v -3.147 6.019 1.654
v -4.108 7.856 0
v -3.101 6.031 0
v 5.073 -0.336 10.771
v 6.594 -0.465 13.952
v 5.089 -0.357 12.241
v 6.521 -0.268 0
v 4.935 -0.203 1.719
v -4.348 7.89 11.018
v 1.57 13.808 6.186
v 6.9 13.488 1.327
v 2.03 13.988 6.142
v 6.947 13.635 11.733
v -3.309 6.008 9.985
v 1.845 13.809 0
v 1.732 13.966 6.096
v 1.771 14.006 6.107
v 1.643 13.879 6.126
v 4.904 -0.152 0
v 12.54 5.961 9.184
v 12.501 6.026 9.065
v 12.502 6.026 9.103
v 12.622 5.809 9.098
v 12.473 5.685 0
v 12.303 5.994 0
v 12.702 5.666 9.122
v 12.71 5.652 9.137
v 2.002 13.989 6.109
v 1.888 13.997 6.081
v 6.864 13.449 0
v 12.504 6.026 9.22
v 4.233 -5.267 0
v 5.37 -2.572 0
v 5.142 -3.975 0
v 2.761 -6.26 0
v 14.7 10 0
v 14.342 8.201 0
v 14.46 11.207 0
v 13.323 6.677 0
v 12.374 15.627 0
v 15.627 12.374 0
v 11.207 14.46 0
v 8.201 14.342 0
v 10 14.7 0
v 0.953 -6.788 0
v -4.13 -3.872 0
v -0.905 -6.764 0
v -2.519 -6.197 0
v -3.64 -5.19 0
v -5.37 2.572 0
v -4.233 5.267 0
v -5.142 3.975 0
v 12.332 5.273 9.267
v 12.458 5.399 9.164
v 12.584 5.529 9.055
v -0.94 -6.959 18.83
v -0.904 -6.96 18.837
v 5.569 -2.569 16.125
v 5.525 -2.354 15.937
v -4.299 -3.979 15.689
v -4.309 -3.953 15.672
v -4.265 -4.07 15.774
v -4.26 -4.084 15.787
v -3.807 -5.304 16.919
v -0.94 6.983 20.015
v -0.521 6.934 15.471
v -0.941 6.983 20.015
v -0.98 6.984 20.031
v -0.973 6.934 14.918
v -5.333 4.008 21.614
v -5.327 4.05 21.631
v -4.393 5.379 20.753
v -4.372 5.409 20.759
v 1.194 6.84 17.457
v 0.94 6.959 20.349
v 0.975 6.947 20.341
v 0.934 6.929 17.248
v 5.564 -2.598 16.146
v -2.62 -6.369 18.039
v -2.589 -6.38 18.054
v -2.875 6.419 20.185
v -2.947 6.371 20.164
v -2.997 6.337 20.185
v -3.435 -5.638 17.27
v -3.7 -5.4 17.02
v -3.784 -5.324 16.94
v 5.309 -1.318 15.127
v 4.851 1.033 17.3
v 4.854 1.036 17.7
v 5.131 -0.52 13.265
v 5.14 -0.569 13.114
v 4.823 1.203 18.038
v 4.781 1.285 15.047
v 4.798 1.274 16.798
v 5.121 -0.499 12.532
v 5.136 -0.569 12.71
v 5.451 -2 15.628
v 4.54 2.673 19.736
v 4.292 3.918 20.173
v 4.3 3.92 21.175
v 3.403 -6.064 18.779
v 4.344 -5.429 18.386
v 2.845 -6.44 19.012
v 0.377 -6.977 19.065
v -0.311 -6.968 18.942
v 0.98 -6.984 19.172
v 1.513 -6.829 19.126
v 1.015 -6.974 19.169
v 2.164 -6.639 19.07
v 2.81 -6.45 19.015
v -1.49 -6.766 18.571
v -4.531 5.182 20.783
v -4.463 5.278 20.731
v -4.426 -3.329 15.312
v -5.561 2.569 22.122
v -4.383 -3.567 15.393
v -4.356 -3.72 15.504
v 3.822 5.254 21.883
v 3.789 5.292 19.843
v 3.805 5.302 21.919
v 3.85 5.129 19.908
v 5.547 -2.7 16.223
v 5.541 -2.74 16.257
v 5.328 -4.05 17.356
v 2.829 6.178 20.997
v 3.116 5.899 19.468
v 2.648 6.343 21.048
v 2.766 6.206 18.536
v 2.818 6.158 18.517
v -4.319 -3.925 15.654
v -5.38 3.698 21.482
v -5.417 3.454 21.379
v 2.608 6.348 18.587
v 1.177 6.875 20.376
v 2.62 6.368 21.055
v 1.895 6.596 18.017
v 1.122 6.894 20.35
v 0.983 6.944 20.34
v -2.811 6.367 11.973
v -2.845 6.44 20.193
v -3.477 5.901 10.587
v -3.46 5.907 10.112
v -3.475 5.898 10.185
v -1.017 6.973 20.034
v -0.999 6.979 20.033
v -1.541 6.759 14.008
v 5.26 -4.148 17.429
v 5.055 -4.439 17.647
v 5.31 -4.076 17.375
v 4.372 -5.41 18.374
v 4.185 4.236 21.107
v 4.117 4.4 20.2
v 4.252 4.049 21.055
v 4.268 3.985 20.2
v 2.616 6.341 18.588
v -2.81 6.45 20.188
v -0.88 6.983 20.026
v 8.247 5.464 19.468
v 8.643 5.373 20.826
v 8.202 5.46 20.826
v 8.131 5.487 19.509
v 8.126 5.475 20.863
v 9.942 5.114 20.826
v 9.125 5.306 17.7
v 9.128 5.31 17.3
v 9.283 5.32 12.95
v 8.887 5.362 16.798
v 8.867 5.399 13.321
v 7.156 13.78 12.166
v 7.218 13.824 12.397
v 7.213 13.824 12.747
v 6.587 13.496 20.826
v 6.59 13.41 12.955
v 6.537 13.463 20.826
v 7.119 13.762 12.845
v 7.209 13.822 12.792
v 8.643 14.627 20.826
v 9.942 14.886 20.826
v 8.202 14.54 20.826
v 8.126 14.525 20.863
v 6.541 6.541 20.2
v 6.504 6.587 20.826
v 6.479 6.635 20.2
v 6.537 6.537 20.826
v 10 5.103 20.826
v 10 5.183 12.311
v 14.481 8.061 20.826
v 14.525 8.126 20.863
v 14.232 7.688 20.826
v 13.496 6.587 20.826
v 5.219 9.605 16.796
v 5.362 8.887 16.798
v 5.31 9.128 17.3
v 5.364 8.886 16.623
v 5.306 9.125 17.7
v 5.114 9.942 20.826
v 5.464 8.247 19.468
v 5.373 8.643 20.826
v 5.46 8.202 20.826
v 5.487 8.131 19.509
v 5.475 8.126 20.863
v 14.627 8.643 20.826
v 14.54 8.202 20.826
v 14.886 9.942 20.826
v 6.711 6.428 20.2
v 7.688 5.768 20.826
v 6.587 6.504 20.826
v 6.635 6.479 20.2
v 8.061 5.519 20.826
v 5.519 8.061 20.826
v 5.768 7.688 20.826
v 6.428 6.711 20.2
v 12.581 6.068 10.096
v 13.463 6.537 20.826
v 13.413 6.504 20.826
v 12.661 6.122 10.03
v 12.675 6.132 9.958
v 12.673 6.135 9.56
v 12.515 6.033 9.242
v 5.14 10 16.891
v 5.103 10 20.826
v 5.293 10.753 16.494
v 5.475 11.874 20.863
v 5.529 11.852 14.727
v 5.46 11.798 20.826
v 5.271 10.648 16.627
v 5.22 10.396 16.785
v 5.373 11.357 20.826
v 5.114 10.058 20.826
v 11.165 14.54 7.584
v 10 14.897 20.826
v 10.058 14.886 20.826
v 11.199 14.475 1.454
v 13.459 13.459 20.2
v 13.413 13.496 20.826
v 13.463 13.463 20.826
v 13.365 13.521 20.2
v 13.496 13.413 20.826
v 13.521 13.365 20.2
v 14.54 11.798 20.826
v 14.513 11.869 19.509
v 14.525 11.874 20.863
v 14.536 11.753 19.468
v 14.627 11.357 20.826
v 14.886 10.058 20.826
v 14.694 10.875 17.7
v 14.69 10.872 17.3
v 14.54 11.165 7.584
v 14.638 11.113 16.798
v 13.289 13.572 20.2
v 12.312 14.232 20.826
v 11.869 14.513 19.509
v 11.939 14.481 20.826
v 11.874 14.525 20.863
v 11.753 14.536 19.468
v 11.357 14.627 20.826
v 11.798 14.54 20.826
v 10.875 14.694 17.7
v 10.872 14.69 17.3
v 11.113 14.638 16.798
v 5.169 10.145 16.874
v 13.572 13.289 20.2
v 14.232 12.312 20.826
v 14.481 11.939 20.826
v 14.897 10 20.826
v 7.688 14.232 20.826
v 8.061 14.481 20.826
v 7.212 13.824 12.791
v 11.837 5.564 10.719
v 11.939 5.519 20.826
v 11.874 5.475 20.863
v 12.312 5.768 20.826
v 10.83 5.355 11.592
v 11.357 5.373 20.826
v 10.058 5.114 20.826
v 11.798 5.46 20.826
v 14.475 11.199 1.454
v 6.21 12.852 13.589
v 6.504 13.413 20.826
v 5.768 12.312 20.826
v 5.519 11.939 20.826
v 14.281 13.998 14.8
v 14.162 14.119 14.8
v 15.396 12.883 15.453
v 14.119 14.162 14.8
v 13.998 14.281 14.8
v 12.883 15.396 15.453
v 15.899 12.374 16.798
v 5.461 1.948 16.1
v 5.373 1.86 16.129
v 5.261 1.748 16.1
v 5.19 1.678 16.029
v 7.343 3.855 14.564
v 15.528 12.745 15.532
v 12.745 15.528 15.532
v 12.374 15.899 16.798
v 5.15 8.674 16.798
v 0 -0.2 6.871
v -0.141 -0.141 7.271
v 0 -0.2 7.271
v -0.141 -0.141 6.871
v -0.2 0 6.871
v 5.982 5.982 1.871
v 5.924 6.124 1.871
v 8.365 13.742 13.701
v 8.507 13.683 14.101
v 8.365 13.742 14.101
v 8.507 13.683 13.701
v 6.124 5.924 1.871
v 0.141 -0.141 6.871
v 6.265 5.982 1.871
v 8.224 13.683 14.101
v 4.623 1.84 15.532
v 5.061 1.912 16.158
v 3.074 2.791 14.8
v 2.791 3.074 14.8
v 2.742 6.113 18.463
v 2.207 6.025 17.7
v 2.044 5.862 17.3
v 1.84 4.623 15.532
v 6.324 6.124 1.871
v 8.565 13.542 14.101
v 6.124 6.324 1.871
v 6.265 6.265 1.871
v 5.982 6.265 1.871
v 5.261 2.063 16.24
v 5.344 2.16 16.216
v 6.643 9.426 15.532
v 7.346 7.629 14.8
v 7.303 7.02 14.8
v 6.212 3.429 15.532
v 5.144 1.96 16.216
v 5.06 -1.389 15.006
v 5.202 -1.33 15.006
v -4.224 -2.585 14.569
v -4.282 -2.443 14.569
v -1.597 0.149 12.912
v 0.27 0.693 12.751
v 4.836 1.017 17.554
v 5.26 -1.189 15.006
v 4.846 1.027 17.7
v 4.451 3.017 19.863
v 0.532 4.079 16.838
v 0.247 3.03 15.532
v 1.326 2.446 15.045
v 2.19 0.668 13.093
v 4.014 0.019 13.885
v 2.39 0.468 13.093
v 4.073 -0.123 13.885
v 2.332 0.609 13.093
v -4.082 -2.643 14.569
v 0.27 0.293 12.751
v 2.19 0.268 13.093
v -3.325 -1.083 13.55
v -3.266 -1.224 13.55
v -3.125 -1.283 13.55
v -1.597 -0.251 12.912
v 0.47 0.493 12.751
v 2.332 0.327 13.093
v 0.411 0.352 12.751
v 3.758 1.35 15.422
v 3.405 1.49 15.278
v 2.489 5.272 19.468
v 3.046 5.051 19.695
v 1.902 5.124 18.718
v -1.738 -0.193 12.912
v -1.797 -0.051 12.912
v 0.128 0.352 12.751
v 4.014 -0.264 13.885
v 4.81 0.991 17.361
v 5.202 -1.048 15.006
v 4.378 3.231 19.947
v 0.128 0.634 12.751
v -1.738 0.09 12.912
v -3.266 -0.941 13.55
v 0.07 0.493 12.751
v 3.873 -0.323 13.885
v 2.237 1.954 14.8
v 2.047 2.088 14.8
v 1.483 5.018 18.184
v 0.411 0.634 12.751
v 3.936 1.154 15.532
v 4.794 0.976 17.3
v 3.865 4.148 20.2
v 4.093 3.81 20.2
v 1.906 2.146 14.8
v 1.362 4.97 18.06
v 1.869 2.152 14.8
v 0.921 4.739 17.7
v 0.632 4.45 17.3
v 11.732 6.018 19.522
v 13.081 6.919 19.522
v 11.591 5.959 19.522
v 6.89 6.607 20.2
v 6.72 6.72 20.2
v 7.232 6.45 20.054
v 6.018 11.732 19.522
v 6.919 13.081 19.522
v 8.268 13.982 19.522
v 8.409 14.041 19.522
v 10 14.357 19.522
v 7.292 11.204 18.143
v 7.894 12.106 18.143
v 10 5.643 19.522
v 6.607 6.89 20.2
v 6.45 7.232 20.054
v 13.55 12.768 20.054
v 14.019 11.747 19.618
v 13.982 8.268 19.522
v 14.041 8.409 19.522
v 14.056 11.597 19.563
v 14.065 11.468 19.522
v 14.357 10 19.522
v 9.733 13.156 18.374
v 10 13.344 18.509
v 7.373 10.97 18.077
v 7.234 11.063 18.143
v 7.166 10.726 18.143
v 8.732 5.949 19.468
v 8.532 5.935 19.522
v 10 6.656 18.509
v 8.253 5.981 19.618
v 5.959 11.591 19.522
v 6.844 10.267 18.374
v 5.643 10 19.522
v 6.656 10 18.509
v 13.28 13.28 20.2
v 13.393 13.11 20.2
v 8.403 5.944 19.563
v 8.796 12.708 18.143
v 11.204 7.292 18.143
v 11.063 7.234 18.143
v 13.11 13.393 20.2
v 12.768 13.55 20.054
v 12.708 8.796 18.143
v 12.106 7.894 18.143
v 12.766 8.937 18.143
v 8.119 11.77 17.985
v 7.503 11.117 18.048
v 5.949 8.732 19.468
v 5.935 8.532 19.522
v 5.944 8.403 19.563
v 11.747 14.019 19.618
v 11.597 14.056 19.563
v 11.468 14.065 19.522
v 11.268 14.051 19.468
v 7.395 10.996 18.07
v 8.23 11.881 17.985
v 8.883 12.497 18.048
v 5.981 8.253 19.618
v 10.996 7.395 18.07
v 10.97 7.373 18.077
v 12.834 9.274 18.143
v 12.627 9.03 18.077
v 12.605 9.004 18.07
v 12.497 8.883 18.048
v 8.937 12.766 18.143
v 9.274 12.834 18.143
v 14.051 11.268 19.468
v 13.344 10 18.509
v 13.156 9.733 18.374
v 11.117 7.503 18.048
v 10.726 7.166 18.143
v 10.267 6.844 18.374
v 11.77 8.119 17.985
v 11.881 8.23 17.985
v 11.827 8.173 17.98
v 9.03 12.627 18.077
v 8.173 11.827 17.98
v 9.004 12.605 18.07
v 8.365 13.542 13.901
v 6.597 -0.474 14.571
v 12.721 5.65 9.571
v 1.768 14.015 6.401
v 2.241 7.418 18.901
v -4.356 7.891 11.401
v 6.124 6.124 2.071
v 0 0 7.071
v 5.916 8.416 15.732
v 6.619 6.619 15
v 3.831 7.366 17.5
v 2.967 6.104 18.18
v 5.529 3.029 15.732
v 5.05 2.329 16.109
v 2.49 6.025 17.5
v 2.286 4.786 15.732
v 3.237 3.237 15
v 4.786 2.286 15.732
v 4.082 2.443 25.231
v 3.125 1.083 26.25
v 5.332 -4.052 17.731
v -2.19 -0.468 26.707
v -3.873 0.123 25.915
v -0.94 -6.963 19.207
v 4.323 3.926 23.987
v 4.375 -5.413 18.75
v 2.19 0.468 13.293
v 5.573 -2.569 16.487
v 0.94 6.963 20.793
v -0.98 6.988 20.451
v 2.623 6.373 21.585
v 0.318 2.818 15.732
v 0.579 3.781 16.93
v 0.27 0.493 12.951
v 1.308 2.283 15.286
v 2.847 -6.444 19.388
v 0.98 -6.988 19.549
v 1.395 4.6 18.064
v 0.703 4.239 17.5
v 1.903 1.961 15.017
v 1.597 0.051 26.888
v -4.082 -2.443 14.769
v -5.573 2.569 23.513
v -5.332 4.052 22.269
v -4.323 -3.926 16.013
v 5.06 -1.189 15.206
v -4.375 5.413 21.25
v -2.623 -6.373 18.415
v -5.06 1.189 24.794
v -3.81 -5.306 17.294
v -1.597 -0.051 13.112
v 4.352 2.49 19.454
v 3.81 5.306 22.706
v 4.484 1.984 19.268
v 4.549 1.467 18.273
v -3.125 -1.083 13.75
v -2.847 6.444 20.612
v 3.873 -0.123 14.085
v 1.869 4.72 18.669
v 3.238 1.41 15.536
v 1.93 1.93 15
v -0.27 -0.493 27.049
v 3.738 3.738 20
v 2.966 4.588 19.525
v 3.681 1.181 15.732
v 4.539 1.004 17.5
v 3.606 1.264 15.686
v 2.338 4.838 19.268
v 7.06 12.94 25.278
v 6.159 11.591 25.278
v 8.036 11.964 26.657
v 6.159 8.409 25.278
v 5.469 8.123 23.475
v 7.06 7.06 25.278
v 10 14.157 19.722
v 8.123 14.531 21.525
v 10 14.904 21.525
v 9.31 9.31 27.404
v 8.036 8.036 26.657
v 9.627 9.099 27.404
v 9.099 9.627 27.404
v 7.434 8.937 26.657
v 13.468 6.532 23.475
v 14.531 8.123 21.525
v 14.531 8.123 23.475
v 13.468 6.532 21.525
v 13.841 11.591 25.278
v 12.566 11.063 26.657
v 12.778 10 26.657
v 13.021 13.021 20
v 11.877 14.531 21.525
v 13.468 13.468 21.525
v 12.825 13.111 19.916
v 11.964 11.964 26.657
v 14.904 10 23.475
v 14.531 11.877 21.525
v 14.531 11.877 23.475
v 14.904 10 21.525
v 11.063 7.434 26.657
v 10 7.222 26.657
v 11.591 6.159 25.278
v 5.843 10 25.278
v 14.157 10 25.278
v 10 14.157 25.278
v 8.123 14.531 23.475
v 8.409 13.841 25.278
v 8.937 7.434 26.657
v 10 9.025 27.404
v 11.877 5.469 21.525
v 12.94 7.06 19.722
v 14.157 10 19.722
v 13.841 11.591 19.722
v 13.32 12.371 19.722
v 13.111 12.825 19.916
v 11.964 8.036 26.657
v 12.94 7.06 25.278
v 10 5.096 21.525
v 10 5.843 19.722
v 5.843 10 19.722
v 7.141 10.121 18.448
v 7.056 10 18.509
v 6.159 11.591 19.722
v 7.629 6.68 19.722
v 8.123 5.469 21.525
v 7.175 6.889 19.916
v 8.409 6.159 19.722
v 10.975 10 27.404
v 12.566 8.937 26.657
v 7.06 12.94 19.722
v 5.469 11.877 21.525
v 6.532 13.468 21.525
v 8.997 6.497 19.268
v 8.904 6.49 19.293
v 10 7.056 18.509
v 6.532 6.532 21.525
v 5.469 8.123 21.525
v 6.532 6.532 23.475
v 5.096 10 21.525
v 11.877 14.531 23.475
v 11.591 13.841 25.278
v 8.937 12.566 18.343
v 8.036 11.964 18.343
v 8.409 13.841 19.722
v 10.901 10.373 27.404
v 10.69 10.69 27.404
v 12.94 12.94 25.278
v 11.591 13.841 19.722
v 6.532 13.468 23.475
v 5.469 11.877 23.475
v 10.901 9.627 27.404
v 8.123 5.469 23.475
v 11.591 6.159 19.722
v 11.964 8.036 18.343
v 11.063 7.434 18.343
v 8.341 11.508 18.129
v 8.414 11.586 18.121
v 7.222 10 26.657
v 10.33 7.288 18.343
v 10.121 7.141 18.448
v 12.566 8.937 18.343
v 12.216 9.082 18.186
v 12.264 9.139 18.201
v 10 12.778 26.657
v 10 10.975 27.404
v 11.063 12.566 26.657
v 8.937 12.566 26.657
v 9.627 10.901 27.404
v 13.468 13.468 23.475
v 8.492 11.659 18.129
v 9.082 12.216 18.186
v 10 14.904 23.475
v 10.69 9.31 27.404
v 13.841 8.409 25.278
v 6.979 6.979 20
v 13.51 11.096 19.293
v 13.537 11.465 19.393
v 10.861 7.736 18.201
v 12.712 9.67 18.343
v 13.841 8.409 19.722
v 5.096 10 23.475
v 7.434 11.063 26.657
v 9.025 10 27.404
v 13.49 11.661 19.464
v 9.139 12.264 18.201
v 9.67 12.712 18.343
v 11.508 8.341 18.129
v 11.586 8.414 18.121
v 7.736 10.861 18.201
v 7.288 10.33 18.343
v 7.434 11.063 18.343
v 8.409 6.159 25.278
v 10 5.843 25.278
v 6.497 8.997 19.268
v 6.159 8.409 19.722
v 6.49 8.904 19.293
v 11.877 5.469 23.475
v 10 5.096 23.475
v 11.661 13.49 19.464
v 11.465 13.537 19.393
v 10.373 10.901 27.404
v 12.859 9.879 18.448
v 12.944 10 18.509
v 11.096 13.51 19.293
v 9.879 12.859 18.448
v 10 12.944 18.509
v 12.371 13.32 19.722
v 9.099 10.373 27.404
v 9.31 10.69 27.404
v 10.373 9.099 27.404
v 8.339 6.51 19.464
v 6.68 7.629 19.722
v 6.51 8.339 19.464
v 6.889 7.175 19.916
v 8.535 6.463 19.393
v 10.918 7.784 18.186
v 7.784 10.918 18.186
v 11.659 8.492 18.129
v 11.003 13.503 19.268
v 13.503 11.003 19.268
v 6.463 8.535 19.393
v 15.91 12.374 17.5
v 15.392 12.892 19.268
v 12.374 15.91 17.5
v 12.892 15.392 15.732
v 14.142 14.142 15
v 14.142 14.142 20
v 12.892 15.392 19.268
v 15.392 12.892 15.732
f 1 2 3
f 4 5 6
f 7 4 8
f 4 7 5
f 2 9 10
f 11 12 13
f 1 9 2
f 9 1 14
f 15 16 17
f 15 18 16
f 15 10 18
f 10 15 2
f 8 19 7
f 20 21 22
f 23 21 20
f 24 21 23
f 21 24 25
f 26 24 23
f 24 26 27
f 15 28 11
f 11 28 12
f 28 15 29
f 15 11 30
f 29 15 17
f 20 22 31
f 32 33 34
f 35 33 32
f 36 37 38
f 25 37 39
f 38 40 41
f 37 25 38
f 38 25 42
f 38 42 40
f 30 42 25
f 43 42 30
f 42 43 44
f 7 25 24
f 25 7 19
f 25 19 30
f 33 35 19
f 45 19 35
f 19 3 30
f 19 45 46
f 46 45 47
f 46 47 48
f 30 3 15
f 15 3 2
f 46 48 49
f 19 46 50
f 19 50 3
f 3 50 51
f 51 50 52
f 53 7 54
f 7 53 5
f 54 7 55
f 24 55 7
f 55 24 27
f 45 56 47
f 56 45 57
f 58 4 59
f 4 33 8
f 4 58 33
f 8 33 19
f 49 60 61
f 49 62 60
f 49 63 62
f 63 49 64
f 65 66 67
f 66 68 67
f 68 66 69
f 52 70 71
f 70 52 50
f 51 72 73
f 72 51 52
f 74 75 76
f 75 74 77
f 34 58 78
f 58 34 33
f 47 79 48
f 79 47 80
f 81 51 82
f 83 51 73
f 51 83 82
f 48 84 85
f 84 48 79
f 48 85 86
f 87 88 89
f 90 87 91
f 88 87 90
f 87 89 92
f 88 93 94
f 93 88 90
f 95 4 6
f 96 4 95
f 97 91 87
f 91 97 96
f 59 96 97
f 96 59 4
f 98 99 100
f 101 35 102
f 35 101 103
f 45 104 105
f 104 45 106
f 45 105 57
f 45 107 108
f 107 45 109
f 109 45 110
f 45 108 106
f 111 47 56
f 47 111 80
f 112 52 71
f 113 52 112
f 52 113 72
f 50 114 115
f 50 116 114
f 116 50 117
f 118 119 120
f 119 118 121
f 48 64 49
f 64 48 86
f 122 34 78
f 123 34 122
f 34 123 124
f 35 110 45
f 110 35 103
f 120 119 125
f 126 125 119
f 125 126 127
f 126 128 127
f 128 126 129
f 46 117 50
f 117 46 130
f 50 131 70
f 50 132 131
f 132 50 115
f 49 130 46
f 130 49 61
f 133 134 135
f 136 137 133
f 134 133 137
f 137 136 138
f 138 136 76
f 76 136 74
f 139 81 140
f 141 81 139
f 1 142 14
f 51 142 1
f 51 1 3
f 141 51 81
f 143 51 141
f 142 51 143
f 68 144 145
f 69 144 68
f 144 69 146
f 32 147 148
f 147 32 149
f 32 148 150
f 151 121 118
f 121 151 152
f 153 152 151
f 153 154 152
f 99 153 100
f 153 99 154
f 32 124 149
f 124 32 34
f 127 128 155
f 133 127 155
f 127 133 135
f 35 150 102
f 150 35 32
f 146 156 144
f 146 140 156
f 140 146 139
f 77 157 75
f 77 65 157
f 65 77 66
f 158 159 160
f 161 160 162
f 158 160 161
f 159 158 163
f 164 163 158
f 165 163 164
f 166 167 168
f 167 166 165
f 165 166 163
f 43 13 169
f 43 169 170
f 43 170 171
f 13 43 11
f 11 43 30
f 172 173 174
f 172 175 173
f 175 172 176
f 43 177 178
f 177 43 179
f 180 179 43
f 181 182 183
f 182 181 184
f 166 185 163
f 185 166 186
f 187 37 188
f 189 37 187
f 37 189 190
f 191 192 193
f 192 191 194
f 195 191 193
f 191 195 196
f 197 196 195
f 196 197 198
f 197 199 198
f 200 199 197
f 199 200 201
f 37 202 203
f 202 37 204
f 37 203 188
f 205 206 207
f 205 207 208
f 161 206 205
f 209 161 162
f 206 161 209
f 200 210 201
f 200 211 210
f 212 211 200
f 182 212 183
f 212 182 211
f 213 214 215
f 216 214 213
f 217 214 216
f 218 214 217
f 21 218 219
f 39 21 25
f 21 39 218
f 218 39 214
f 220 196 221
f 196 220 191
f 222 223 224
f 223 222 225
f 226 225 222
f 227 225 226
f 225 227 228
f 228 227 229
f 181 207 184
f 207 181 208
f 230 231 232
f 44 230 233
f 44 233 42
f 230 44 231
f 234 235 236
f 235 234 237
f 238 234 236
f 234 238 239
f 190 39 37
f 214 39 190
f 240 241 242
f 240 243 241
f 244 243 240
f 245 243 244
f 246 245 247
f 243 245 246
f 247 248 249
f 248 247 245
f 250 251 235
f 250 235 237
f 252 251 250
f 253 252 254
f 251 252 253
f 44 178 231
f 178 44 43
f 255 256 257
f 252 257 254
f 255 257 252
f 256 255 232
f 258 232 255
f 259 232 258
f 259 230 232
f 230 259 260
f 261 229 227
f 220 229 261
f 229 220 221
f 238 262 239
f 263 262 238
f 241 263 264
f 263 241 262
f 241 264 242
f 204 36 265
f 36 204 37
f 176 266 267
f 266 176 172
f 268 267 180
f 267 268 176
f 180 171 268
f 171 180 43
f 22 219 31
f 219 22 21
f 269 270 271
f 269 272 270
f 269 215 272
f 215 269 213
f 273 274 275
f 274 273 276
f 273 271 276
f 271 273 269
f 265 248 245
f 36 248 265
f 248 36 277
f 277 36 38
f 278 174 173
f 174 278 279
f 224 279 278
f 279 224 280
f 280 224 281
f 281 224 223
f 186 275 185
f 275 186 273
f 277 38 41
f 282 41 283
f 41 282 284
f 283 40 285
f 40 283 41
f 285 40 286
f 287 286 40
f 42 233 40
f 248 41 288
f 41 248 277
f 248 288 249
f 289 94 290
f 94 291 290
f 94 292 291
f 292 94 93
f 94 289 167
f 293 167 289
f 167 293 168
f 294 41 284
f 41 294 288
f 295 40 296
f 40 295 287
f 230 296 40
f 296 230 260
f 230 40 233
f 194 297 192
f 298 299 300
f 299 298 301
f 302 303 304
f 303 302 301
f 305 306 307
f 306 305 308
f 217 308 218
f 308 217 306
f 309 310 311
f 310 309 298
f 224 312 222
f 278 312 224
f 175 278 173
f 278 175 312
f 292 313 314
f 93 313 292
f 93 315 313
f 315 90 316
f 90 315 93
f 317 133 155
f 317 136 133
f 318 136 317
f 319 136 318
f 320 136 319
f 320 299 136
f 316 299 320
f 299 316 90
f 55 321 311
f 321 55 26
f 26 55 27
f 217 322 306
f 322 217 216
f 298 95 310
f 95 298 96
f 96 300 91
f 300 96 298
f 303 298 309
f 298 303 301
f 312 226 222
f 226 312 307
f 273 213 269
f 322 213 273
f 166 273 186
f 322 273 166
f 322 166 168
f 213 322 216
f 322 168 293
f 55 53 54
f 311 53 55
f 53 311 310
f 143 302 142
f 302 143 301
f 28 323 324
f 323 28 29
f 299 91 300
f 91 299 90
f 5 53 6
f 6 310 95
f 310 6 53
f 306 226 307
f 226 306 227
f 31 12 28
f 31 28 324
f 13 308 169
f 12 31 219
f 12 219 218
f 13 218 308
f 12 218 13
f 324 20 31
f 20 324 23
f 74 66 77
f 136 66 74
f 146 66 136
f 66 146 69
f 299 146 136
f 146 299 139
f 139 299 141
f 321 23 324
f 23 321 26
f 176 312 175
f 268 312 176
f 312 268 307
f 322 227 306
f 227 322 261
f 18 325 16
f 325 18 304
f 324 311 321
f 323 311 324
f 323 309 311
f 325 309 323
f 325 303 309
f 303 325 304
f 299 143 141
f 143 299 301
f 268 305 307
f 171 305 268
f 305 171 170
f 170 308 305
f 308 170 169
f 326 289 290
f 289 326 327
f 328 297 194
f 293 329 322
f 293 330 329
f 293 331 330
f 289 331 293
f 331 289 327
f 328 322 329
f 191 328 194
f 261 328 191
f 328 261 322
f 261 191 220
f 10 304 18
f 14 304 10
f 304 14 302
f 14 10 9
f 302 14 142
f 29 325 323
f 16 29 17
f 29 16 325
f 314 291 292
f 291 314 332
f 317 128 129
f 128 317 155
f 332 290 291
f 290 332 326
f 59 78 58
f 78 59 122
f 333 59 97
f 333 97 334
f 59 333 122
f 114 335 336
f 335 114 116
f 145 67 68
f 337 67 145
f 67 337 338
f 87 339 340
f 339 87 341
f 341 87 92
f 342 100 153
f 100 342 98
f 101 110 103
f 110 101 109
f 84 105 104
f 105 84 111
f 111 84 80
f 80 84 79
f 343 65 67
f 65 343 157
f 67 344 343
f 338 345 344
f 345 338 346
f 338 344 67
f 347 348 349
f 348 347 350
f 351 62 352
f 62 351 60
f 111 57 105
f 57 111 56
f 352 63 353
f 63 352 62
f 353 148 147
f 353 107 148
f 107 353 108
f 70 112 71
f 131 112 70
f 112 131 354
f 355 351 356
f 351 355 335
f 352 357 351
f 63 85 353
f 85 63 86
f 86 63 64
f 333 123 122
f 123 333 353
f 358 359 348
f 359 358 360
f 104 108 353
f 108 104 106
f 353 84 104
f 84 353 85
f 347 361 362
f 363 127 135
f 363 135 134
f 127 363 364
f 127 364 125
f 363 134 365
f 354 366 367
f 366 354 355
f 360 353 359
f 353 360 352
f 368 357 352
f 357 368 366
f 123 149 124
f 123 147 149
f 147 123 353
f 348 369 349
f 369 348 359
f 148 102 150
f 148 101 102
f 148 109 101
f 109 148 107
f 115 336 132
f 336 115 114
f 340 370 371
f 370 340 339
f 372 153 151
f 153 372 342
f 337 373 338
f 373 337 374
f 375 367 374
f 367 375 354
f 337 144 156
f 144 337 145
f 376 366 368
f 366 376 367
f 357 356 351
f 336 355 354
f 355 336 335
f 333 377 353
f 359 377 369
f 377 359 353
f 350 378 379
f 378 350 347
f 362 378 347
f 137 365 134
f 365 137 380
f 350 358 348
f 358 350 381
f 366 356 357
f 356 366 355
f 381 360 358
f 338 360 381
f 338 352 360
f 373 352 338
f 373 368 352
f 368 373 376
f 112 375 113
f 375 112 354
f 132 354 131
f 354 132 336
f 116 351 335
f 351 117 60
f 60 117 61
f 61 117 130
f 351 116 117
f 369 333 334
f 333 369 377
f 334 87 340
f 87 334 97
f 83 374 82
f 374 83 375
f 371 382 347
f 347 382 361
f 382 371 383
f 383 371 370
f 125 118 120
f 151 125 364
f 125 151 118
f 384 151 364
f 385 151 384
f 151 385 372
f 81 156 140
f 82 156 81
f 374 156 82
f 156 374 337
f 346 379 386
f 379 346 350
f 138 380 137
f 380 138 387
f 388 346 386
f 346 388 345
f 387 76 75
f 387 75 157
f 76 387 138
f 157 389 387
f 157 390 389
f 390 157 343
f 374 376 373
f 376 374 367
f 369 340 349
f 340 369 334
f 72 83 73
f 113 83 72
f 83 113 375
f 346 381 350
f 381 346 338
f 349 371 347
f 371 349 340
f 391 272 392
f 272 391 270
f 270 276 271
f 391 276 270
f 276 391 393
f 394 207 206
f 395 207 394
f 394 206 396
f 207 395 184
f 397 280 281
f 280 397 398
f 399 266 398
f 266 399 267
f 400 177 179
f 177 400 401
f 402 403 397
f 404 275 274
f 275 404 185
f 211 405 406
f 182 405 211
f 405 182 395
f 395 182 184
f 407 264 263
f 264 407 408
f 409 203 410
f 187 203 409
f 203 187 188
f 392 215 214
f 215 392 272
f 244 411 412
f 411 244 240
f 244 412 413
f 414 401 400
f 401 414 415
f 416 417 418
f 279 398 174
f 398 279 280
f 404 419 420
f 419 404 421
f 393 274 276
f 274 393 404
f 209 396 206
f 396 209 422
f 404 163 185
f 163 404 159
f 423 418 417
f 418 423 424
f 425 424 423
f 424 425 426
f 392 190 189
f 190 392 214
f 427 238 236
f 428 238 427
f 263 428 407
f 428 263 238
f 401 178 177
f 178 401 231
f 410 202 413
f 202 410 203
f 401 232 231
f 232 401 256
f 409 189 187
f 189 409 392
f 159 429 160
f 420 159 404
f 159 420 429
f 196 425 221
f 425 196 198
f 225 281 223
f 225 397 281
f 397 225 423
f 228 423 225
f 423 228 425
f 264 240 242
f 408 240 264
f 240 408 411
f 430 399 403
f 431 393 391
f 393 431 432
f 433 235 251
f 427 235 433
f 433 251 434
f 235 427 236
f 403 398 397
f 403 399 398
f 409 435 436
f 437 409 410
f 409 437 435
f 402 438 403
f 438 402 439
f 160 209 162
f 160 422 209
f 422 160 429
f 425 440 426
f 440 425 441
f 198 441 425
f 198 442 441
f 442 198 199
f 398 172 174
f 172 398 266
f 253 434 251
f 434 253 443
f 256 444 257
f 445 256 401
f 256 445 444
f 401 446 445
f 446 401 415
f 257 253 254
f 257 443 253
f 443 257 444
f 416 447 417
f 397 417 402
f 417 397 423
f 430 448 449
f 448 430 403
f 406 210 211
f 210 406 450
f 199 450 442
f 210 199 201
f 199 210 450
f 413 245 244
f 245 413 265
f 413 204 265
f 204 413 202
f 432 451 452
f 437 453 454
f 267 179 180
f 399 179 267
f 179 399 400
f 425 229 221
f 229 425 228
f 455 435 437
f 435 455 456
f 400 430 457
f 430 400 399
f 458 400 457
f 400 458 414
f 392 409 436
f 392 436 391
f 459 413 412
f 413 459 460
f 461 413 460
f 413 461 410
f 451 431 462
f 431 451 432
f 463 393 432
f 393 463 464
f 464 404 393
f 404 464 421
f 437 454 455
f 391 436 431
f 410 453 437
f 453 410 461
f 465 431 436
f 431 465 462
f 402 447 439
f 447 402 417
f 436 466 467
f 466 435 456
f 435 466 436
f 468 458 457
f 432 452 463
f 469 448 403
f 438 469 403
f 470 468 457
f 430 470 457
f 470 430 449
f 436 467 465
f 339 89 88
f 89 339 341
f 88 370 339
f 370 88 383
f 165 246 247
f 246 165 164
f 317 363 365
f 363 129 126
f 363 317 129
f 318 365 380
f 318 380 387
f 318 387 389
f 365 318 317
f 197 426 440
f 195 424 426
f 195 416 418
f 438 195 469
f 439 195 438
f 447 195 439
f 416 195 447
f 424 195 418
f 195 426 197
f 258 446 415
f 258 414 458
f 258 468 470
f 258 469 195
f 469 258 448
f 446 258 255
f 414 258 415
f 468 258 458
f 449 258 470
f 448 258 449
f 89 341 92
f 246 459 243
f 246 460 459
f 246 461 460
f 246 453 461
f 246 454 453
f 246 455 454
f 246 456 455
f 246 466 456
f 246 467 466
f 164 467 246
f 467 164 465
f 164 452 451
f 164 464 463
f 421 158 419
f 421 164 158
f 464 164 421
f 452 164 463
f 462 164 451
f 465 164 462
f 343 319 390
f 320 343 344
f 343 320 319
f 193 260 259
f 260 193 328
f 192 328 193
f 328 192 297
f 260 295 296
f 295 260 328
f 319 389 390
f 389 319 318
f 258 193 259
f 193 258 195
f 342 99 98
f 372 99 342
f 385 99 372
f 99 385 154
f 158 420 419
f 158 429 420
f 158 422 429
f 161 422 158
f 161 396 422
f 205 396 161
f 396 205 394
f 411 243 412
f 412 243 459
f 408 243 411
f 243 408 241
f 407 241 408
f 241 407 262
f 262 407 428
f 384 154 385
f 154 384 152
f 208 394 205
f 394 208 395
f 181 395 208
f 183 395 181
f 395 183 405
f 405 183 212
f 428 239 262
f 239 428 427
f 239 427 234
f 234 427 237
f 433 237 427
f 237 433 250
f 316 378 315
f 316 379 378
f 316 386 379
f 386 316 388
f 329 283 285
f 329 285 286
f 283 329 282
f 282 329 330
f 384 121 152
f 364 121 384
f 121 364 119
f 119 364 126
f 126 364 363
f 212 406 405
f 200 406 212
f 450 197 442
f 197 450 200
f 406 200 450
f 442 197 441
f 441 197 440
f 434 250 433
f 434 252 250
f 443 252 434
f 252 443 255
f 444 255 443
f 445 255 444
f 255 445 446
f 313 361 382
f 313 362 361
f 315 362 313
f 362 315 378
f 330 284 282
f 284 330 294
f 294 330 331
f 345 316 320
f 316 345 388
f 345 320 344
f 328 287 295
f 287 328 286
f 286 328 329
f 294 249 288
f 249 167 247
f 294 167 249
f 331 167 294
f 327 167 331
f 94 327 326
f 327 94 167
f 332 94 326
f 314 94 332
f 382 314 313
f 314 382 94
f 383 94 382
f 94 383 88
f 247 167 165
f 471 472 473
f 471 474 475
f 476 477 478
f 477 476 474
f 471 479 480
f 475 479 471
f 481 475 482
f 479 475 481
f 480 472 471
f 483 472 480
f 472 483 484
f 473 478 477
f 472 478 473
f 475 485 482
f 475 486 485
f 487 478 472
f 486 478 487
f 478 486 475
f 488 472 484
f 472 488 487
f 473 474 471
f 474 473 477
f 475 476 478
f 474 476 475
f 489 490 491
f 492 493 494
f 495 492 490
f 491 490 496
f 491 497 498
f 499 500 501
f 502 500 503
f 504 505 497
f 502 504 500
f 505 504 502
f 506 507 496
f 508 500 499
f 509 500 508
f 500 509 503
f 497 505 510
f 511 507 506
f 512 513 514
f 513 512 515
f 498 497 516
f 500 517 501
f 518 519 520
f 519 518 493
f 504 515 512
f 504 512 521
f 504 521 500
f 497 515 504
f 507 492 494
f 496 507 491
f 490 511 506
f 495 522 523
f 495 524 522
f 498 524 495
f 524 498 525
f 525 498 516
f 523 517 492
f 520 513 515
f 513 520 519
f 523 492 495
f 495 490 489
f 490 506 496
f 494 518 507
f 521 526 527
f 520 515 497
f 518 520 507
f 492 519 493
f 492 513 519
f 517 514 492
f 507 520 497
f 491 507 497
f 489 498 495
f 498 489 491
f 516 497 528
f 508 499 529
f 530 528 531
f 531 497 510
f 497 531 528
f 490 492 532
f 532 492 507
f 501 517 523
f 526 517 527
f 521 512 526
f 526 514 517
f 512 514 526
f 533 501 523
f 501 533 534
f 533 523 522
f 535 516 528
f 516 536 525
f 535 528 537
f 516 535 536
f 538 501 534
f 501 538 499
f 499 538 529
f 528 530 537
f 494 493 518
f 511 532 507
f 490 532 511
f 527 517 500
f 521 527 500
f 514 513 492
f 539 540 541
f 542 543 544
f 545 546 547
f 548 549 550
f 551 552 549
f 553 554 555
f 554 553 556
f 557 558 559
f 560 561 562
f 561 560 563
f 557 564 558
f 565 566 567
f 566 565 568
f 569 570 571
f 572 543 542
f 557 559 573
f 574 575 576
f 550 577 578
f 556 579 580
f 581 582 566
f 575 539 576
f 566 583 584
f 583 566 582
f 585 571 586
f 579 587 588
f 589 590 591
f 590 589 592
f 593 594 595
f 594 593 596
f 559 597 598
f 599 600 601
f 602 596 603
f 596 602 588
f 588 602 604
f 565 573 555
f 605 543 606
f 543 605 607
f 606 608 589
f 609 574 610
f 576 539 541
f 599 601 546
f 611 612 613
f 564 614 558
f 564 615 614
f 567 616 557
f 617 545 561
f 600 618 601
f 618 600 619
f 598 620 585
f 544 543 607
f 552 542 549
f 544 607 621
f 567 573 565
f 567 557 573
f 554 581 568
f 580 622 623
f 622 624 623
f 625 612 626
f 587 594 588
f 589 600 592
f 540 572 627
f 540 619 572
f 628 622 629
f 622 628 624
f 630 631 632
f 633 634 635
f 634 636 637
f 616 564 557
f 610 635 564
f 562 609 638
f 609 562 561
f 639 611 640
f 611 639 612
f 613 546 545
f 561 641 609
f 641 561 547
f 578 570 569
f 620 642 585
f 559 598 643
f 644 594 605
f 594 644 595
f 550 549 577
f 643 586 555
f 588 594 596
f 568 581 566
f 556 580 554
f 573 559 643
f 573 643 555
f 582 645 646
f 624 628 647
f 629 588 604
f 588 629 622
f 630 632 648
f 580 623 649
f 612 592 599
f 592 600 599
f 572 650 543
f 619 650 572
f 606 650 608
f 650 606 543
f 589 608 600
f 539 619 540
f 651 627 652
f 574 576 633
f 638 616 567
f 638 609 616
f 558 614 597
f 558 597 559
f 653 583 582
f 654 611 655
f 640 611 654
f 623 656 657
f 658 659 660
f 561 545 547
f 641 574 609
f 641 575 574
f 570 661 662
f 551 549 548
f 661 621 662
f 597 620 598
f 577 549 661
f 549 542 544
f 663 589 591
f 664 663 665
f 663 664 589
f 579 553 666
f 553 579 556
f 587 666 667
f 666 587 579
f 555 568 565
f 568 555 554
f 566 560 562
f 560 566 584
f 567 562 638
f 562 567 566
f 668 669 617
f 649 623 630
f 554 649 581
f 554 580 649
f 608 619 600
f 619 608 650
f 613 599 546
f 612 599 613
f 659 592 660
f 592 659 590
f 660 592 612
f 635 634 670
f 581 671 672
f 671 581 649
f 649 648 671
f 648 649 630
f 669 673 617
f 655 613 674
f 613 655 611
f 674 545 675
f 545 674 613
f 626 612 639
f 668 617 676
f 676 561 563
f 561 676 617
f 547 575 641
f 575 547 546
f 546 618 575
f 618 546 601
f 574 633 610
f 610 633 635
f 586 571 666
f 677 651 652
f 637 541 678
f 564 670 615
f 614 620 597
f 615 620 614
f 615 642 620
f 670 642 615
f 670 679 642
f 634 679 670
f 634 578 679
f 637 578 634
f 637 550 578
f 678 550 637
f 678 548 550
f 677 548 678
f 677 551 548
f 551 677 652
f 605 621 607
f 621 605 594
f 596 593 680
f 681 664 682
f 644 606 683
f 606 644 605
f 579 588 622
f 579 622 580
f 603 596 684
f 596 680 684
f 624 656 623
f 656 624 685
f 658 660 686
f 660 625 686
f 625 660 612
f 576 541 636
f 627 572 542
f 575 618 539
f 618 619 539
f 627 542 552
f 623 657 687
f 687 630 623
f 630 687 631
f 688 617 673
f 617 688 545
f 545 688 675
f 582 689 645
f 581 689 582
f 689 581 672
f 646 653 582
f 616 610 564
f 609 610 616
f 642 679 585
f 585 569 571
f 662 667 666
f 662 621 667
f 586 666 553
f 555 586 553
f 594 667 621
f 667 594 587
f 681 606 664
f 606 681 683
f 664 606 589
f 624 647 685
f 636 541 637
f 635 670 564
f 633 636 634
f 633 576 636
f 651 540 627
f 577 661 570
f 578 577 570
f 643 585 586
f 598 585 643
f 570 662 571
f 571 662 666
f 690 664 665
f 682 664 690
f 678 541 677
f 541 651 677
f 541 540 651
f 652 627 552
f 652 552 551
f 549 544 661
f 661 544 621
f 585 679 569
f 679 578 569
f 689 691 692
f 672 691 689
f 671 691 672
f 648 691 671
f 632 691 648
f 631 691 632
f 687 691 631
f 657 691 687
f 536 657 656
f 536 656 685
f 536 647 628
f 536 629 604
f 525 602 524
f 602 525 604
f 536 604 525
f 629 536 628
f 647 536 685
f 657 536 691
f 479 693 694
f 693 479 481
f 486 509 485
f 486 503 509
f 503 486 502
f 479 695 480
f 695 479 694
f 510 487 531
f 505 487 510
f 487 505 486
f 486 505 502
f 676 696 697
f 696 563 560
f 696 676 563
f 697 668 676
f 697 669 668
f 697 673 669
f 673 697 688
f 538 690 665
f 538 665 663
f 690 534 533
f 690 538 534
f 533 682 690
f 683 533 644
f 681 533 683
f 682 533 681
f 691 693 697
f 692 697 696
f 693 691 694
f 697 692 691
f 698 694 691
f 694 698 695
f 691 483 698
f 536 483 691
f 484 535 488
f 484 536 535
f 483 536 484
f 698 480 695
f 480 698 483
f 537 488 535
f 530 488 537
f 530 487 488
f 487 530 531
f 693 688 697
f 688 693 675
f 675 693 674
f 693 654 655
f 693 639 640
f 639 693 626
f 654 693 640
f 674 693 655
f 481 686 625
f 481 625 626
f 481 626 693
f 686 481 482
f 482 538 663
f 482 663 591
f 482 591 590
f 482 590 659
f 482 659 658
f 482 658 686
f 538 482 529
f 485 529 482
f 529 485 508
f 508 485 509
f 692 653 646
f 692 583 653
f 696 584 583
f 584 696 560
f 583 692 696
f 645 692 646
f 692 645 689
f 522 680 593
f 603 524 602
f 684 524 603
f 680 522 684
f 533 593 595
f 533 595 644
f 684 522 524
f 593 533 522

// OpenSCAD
// concave support generator example
// - Assumes children() to be concave geometries.

render_part="test concave_support";

nozzle_d=0.4;
layer_th=0.2;

module concave_support(outline_shrink=nozzle_d/2,support_offset=layer_th) {
    render() difference() {
        union() for(i=[0:$children-1]) {
            hull() {
                linear_extrude(height=support_offset) 
                    offset(-outline_shrink) projection(cut=false) children(i);
                children(i);
            }
        }
        for(i=[0:$children-1]) minkowski() {
            children(i);
            cylinder(r=support_offset,h=2*support_offset,center=true,$fn=8);
        }
    }
}

module test_cube1() {
    translate([0,0,5*sqrt(2)]) rotate([30,30,45]) cube(10);
}

module test_cylinder1() {
    translate([0,0,20]) rotate([-30,-30,-30]) cylinder(r=5,h=10,center=true);
}

module test_sphere1() {
    translate([10,10,22.5]) sphere(r=5);
}

module test_axle1() {
    translate([0,0,17.5]) rotate([0,90,45]) cylinder(r=2.5,h=20,center=false);
}

if( render_part=="test concave_support" ) {
    echo("Test concave_support...");
    color([1,0,0]) test_cube1();
    color([0,1,0]) test_cylinder1();
    color([0,0,1]) test_sphere1();
    color([0,0,0]) test_axle1();
    # concave_support() {
        test_cube1();
        test_cylinder1();
        test_sphere1();
        test_axle1();
    }
}
